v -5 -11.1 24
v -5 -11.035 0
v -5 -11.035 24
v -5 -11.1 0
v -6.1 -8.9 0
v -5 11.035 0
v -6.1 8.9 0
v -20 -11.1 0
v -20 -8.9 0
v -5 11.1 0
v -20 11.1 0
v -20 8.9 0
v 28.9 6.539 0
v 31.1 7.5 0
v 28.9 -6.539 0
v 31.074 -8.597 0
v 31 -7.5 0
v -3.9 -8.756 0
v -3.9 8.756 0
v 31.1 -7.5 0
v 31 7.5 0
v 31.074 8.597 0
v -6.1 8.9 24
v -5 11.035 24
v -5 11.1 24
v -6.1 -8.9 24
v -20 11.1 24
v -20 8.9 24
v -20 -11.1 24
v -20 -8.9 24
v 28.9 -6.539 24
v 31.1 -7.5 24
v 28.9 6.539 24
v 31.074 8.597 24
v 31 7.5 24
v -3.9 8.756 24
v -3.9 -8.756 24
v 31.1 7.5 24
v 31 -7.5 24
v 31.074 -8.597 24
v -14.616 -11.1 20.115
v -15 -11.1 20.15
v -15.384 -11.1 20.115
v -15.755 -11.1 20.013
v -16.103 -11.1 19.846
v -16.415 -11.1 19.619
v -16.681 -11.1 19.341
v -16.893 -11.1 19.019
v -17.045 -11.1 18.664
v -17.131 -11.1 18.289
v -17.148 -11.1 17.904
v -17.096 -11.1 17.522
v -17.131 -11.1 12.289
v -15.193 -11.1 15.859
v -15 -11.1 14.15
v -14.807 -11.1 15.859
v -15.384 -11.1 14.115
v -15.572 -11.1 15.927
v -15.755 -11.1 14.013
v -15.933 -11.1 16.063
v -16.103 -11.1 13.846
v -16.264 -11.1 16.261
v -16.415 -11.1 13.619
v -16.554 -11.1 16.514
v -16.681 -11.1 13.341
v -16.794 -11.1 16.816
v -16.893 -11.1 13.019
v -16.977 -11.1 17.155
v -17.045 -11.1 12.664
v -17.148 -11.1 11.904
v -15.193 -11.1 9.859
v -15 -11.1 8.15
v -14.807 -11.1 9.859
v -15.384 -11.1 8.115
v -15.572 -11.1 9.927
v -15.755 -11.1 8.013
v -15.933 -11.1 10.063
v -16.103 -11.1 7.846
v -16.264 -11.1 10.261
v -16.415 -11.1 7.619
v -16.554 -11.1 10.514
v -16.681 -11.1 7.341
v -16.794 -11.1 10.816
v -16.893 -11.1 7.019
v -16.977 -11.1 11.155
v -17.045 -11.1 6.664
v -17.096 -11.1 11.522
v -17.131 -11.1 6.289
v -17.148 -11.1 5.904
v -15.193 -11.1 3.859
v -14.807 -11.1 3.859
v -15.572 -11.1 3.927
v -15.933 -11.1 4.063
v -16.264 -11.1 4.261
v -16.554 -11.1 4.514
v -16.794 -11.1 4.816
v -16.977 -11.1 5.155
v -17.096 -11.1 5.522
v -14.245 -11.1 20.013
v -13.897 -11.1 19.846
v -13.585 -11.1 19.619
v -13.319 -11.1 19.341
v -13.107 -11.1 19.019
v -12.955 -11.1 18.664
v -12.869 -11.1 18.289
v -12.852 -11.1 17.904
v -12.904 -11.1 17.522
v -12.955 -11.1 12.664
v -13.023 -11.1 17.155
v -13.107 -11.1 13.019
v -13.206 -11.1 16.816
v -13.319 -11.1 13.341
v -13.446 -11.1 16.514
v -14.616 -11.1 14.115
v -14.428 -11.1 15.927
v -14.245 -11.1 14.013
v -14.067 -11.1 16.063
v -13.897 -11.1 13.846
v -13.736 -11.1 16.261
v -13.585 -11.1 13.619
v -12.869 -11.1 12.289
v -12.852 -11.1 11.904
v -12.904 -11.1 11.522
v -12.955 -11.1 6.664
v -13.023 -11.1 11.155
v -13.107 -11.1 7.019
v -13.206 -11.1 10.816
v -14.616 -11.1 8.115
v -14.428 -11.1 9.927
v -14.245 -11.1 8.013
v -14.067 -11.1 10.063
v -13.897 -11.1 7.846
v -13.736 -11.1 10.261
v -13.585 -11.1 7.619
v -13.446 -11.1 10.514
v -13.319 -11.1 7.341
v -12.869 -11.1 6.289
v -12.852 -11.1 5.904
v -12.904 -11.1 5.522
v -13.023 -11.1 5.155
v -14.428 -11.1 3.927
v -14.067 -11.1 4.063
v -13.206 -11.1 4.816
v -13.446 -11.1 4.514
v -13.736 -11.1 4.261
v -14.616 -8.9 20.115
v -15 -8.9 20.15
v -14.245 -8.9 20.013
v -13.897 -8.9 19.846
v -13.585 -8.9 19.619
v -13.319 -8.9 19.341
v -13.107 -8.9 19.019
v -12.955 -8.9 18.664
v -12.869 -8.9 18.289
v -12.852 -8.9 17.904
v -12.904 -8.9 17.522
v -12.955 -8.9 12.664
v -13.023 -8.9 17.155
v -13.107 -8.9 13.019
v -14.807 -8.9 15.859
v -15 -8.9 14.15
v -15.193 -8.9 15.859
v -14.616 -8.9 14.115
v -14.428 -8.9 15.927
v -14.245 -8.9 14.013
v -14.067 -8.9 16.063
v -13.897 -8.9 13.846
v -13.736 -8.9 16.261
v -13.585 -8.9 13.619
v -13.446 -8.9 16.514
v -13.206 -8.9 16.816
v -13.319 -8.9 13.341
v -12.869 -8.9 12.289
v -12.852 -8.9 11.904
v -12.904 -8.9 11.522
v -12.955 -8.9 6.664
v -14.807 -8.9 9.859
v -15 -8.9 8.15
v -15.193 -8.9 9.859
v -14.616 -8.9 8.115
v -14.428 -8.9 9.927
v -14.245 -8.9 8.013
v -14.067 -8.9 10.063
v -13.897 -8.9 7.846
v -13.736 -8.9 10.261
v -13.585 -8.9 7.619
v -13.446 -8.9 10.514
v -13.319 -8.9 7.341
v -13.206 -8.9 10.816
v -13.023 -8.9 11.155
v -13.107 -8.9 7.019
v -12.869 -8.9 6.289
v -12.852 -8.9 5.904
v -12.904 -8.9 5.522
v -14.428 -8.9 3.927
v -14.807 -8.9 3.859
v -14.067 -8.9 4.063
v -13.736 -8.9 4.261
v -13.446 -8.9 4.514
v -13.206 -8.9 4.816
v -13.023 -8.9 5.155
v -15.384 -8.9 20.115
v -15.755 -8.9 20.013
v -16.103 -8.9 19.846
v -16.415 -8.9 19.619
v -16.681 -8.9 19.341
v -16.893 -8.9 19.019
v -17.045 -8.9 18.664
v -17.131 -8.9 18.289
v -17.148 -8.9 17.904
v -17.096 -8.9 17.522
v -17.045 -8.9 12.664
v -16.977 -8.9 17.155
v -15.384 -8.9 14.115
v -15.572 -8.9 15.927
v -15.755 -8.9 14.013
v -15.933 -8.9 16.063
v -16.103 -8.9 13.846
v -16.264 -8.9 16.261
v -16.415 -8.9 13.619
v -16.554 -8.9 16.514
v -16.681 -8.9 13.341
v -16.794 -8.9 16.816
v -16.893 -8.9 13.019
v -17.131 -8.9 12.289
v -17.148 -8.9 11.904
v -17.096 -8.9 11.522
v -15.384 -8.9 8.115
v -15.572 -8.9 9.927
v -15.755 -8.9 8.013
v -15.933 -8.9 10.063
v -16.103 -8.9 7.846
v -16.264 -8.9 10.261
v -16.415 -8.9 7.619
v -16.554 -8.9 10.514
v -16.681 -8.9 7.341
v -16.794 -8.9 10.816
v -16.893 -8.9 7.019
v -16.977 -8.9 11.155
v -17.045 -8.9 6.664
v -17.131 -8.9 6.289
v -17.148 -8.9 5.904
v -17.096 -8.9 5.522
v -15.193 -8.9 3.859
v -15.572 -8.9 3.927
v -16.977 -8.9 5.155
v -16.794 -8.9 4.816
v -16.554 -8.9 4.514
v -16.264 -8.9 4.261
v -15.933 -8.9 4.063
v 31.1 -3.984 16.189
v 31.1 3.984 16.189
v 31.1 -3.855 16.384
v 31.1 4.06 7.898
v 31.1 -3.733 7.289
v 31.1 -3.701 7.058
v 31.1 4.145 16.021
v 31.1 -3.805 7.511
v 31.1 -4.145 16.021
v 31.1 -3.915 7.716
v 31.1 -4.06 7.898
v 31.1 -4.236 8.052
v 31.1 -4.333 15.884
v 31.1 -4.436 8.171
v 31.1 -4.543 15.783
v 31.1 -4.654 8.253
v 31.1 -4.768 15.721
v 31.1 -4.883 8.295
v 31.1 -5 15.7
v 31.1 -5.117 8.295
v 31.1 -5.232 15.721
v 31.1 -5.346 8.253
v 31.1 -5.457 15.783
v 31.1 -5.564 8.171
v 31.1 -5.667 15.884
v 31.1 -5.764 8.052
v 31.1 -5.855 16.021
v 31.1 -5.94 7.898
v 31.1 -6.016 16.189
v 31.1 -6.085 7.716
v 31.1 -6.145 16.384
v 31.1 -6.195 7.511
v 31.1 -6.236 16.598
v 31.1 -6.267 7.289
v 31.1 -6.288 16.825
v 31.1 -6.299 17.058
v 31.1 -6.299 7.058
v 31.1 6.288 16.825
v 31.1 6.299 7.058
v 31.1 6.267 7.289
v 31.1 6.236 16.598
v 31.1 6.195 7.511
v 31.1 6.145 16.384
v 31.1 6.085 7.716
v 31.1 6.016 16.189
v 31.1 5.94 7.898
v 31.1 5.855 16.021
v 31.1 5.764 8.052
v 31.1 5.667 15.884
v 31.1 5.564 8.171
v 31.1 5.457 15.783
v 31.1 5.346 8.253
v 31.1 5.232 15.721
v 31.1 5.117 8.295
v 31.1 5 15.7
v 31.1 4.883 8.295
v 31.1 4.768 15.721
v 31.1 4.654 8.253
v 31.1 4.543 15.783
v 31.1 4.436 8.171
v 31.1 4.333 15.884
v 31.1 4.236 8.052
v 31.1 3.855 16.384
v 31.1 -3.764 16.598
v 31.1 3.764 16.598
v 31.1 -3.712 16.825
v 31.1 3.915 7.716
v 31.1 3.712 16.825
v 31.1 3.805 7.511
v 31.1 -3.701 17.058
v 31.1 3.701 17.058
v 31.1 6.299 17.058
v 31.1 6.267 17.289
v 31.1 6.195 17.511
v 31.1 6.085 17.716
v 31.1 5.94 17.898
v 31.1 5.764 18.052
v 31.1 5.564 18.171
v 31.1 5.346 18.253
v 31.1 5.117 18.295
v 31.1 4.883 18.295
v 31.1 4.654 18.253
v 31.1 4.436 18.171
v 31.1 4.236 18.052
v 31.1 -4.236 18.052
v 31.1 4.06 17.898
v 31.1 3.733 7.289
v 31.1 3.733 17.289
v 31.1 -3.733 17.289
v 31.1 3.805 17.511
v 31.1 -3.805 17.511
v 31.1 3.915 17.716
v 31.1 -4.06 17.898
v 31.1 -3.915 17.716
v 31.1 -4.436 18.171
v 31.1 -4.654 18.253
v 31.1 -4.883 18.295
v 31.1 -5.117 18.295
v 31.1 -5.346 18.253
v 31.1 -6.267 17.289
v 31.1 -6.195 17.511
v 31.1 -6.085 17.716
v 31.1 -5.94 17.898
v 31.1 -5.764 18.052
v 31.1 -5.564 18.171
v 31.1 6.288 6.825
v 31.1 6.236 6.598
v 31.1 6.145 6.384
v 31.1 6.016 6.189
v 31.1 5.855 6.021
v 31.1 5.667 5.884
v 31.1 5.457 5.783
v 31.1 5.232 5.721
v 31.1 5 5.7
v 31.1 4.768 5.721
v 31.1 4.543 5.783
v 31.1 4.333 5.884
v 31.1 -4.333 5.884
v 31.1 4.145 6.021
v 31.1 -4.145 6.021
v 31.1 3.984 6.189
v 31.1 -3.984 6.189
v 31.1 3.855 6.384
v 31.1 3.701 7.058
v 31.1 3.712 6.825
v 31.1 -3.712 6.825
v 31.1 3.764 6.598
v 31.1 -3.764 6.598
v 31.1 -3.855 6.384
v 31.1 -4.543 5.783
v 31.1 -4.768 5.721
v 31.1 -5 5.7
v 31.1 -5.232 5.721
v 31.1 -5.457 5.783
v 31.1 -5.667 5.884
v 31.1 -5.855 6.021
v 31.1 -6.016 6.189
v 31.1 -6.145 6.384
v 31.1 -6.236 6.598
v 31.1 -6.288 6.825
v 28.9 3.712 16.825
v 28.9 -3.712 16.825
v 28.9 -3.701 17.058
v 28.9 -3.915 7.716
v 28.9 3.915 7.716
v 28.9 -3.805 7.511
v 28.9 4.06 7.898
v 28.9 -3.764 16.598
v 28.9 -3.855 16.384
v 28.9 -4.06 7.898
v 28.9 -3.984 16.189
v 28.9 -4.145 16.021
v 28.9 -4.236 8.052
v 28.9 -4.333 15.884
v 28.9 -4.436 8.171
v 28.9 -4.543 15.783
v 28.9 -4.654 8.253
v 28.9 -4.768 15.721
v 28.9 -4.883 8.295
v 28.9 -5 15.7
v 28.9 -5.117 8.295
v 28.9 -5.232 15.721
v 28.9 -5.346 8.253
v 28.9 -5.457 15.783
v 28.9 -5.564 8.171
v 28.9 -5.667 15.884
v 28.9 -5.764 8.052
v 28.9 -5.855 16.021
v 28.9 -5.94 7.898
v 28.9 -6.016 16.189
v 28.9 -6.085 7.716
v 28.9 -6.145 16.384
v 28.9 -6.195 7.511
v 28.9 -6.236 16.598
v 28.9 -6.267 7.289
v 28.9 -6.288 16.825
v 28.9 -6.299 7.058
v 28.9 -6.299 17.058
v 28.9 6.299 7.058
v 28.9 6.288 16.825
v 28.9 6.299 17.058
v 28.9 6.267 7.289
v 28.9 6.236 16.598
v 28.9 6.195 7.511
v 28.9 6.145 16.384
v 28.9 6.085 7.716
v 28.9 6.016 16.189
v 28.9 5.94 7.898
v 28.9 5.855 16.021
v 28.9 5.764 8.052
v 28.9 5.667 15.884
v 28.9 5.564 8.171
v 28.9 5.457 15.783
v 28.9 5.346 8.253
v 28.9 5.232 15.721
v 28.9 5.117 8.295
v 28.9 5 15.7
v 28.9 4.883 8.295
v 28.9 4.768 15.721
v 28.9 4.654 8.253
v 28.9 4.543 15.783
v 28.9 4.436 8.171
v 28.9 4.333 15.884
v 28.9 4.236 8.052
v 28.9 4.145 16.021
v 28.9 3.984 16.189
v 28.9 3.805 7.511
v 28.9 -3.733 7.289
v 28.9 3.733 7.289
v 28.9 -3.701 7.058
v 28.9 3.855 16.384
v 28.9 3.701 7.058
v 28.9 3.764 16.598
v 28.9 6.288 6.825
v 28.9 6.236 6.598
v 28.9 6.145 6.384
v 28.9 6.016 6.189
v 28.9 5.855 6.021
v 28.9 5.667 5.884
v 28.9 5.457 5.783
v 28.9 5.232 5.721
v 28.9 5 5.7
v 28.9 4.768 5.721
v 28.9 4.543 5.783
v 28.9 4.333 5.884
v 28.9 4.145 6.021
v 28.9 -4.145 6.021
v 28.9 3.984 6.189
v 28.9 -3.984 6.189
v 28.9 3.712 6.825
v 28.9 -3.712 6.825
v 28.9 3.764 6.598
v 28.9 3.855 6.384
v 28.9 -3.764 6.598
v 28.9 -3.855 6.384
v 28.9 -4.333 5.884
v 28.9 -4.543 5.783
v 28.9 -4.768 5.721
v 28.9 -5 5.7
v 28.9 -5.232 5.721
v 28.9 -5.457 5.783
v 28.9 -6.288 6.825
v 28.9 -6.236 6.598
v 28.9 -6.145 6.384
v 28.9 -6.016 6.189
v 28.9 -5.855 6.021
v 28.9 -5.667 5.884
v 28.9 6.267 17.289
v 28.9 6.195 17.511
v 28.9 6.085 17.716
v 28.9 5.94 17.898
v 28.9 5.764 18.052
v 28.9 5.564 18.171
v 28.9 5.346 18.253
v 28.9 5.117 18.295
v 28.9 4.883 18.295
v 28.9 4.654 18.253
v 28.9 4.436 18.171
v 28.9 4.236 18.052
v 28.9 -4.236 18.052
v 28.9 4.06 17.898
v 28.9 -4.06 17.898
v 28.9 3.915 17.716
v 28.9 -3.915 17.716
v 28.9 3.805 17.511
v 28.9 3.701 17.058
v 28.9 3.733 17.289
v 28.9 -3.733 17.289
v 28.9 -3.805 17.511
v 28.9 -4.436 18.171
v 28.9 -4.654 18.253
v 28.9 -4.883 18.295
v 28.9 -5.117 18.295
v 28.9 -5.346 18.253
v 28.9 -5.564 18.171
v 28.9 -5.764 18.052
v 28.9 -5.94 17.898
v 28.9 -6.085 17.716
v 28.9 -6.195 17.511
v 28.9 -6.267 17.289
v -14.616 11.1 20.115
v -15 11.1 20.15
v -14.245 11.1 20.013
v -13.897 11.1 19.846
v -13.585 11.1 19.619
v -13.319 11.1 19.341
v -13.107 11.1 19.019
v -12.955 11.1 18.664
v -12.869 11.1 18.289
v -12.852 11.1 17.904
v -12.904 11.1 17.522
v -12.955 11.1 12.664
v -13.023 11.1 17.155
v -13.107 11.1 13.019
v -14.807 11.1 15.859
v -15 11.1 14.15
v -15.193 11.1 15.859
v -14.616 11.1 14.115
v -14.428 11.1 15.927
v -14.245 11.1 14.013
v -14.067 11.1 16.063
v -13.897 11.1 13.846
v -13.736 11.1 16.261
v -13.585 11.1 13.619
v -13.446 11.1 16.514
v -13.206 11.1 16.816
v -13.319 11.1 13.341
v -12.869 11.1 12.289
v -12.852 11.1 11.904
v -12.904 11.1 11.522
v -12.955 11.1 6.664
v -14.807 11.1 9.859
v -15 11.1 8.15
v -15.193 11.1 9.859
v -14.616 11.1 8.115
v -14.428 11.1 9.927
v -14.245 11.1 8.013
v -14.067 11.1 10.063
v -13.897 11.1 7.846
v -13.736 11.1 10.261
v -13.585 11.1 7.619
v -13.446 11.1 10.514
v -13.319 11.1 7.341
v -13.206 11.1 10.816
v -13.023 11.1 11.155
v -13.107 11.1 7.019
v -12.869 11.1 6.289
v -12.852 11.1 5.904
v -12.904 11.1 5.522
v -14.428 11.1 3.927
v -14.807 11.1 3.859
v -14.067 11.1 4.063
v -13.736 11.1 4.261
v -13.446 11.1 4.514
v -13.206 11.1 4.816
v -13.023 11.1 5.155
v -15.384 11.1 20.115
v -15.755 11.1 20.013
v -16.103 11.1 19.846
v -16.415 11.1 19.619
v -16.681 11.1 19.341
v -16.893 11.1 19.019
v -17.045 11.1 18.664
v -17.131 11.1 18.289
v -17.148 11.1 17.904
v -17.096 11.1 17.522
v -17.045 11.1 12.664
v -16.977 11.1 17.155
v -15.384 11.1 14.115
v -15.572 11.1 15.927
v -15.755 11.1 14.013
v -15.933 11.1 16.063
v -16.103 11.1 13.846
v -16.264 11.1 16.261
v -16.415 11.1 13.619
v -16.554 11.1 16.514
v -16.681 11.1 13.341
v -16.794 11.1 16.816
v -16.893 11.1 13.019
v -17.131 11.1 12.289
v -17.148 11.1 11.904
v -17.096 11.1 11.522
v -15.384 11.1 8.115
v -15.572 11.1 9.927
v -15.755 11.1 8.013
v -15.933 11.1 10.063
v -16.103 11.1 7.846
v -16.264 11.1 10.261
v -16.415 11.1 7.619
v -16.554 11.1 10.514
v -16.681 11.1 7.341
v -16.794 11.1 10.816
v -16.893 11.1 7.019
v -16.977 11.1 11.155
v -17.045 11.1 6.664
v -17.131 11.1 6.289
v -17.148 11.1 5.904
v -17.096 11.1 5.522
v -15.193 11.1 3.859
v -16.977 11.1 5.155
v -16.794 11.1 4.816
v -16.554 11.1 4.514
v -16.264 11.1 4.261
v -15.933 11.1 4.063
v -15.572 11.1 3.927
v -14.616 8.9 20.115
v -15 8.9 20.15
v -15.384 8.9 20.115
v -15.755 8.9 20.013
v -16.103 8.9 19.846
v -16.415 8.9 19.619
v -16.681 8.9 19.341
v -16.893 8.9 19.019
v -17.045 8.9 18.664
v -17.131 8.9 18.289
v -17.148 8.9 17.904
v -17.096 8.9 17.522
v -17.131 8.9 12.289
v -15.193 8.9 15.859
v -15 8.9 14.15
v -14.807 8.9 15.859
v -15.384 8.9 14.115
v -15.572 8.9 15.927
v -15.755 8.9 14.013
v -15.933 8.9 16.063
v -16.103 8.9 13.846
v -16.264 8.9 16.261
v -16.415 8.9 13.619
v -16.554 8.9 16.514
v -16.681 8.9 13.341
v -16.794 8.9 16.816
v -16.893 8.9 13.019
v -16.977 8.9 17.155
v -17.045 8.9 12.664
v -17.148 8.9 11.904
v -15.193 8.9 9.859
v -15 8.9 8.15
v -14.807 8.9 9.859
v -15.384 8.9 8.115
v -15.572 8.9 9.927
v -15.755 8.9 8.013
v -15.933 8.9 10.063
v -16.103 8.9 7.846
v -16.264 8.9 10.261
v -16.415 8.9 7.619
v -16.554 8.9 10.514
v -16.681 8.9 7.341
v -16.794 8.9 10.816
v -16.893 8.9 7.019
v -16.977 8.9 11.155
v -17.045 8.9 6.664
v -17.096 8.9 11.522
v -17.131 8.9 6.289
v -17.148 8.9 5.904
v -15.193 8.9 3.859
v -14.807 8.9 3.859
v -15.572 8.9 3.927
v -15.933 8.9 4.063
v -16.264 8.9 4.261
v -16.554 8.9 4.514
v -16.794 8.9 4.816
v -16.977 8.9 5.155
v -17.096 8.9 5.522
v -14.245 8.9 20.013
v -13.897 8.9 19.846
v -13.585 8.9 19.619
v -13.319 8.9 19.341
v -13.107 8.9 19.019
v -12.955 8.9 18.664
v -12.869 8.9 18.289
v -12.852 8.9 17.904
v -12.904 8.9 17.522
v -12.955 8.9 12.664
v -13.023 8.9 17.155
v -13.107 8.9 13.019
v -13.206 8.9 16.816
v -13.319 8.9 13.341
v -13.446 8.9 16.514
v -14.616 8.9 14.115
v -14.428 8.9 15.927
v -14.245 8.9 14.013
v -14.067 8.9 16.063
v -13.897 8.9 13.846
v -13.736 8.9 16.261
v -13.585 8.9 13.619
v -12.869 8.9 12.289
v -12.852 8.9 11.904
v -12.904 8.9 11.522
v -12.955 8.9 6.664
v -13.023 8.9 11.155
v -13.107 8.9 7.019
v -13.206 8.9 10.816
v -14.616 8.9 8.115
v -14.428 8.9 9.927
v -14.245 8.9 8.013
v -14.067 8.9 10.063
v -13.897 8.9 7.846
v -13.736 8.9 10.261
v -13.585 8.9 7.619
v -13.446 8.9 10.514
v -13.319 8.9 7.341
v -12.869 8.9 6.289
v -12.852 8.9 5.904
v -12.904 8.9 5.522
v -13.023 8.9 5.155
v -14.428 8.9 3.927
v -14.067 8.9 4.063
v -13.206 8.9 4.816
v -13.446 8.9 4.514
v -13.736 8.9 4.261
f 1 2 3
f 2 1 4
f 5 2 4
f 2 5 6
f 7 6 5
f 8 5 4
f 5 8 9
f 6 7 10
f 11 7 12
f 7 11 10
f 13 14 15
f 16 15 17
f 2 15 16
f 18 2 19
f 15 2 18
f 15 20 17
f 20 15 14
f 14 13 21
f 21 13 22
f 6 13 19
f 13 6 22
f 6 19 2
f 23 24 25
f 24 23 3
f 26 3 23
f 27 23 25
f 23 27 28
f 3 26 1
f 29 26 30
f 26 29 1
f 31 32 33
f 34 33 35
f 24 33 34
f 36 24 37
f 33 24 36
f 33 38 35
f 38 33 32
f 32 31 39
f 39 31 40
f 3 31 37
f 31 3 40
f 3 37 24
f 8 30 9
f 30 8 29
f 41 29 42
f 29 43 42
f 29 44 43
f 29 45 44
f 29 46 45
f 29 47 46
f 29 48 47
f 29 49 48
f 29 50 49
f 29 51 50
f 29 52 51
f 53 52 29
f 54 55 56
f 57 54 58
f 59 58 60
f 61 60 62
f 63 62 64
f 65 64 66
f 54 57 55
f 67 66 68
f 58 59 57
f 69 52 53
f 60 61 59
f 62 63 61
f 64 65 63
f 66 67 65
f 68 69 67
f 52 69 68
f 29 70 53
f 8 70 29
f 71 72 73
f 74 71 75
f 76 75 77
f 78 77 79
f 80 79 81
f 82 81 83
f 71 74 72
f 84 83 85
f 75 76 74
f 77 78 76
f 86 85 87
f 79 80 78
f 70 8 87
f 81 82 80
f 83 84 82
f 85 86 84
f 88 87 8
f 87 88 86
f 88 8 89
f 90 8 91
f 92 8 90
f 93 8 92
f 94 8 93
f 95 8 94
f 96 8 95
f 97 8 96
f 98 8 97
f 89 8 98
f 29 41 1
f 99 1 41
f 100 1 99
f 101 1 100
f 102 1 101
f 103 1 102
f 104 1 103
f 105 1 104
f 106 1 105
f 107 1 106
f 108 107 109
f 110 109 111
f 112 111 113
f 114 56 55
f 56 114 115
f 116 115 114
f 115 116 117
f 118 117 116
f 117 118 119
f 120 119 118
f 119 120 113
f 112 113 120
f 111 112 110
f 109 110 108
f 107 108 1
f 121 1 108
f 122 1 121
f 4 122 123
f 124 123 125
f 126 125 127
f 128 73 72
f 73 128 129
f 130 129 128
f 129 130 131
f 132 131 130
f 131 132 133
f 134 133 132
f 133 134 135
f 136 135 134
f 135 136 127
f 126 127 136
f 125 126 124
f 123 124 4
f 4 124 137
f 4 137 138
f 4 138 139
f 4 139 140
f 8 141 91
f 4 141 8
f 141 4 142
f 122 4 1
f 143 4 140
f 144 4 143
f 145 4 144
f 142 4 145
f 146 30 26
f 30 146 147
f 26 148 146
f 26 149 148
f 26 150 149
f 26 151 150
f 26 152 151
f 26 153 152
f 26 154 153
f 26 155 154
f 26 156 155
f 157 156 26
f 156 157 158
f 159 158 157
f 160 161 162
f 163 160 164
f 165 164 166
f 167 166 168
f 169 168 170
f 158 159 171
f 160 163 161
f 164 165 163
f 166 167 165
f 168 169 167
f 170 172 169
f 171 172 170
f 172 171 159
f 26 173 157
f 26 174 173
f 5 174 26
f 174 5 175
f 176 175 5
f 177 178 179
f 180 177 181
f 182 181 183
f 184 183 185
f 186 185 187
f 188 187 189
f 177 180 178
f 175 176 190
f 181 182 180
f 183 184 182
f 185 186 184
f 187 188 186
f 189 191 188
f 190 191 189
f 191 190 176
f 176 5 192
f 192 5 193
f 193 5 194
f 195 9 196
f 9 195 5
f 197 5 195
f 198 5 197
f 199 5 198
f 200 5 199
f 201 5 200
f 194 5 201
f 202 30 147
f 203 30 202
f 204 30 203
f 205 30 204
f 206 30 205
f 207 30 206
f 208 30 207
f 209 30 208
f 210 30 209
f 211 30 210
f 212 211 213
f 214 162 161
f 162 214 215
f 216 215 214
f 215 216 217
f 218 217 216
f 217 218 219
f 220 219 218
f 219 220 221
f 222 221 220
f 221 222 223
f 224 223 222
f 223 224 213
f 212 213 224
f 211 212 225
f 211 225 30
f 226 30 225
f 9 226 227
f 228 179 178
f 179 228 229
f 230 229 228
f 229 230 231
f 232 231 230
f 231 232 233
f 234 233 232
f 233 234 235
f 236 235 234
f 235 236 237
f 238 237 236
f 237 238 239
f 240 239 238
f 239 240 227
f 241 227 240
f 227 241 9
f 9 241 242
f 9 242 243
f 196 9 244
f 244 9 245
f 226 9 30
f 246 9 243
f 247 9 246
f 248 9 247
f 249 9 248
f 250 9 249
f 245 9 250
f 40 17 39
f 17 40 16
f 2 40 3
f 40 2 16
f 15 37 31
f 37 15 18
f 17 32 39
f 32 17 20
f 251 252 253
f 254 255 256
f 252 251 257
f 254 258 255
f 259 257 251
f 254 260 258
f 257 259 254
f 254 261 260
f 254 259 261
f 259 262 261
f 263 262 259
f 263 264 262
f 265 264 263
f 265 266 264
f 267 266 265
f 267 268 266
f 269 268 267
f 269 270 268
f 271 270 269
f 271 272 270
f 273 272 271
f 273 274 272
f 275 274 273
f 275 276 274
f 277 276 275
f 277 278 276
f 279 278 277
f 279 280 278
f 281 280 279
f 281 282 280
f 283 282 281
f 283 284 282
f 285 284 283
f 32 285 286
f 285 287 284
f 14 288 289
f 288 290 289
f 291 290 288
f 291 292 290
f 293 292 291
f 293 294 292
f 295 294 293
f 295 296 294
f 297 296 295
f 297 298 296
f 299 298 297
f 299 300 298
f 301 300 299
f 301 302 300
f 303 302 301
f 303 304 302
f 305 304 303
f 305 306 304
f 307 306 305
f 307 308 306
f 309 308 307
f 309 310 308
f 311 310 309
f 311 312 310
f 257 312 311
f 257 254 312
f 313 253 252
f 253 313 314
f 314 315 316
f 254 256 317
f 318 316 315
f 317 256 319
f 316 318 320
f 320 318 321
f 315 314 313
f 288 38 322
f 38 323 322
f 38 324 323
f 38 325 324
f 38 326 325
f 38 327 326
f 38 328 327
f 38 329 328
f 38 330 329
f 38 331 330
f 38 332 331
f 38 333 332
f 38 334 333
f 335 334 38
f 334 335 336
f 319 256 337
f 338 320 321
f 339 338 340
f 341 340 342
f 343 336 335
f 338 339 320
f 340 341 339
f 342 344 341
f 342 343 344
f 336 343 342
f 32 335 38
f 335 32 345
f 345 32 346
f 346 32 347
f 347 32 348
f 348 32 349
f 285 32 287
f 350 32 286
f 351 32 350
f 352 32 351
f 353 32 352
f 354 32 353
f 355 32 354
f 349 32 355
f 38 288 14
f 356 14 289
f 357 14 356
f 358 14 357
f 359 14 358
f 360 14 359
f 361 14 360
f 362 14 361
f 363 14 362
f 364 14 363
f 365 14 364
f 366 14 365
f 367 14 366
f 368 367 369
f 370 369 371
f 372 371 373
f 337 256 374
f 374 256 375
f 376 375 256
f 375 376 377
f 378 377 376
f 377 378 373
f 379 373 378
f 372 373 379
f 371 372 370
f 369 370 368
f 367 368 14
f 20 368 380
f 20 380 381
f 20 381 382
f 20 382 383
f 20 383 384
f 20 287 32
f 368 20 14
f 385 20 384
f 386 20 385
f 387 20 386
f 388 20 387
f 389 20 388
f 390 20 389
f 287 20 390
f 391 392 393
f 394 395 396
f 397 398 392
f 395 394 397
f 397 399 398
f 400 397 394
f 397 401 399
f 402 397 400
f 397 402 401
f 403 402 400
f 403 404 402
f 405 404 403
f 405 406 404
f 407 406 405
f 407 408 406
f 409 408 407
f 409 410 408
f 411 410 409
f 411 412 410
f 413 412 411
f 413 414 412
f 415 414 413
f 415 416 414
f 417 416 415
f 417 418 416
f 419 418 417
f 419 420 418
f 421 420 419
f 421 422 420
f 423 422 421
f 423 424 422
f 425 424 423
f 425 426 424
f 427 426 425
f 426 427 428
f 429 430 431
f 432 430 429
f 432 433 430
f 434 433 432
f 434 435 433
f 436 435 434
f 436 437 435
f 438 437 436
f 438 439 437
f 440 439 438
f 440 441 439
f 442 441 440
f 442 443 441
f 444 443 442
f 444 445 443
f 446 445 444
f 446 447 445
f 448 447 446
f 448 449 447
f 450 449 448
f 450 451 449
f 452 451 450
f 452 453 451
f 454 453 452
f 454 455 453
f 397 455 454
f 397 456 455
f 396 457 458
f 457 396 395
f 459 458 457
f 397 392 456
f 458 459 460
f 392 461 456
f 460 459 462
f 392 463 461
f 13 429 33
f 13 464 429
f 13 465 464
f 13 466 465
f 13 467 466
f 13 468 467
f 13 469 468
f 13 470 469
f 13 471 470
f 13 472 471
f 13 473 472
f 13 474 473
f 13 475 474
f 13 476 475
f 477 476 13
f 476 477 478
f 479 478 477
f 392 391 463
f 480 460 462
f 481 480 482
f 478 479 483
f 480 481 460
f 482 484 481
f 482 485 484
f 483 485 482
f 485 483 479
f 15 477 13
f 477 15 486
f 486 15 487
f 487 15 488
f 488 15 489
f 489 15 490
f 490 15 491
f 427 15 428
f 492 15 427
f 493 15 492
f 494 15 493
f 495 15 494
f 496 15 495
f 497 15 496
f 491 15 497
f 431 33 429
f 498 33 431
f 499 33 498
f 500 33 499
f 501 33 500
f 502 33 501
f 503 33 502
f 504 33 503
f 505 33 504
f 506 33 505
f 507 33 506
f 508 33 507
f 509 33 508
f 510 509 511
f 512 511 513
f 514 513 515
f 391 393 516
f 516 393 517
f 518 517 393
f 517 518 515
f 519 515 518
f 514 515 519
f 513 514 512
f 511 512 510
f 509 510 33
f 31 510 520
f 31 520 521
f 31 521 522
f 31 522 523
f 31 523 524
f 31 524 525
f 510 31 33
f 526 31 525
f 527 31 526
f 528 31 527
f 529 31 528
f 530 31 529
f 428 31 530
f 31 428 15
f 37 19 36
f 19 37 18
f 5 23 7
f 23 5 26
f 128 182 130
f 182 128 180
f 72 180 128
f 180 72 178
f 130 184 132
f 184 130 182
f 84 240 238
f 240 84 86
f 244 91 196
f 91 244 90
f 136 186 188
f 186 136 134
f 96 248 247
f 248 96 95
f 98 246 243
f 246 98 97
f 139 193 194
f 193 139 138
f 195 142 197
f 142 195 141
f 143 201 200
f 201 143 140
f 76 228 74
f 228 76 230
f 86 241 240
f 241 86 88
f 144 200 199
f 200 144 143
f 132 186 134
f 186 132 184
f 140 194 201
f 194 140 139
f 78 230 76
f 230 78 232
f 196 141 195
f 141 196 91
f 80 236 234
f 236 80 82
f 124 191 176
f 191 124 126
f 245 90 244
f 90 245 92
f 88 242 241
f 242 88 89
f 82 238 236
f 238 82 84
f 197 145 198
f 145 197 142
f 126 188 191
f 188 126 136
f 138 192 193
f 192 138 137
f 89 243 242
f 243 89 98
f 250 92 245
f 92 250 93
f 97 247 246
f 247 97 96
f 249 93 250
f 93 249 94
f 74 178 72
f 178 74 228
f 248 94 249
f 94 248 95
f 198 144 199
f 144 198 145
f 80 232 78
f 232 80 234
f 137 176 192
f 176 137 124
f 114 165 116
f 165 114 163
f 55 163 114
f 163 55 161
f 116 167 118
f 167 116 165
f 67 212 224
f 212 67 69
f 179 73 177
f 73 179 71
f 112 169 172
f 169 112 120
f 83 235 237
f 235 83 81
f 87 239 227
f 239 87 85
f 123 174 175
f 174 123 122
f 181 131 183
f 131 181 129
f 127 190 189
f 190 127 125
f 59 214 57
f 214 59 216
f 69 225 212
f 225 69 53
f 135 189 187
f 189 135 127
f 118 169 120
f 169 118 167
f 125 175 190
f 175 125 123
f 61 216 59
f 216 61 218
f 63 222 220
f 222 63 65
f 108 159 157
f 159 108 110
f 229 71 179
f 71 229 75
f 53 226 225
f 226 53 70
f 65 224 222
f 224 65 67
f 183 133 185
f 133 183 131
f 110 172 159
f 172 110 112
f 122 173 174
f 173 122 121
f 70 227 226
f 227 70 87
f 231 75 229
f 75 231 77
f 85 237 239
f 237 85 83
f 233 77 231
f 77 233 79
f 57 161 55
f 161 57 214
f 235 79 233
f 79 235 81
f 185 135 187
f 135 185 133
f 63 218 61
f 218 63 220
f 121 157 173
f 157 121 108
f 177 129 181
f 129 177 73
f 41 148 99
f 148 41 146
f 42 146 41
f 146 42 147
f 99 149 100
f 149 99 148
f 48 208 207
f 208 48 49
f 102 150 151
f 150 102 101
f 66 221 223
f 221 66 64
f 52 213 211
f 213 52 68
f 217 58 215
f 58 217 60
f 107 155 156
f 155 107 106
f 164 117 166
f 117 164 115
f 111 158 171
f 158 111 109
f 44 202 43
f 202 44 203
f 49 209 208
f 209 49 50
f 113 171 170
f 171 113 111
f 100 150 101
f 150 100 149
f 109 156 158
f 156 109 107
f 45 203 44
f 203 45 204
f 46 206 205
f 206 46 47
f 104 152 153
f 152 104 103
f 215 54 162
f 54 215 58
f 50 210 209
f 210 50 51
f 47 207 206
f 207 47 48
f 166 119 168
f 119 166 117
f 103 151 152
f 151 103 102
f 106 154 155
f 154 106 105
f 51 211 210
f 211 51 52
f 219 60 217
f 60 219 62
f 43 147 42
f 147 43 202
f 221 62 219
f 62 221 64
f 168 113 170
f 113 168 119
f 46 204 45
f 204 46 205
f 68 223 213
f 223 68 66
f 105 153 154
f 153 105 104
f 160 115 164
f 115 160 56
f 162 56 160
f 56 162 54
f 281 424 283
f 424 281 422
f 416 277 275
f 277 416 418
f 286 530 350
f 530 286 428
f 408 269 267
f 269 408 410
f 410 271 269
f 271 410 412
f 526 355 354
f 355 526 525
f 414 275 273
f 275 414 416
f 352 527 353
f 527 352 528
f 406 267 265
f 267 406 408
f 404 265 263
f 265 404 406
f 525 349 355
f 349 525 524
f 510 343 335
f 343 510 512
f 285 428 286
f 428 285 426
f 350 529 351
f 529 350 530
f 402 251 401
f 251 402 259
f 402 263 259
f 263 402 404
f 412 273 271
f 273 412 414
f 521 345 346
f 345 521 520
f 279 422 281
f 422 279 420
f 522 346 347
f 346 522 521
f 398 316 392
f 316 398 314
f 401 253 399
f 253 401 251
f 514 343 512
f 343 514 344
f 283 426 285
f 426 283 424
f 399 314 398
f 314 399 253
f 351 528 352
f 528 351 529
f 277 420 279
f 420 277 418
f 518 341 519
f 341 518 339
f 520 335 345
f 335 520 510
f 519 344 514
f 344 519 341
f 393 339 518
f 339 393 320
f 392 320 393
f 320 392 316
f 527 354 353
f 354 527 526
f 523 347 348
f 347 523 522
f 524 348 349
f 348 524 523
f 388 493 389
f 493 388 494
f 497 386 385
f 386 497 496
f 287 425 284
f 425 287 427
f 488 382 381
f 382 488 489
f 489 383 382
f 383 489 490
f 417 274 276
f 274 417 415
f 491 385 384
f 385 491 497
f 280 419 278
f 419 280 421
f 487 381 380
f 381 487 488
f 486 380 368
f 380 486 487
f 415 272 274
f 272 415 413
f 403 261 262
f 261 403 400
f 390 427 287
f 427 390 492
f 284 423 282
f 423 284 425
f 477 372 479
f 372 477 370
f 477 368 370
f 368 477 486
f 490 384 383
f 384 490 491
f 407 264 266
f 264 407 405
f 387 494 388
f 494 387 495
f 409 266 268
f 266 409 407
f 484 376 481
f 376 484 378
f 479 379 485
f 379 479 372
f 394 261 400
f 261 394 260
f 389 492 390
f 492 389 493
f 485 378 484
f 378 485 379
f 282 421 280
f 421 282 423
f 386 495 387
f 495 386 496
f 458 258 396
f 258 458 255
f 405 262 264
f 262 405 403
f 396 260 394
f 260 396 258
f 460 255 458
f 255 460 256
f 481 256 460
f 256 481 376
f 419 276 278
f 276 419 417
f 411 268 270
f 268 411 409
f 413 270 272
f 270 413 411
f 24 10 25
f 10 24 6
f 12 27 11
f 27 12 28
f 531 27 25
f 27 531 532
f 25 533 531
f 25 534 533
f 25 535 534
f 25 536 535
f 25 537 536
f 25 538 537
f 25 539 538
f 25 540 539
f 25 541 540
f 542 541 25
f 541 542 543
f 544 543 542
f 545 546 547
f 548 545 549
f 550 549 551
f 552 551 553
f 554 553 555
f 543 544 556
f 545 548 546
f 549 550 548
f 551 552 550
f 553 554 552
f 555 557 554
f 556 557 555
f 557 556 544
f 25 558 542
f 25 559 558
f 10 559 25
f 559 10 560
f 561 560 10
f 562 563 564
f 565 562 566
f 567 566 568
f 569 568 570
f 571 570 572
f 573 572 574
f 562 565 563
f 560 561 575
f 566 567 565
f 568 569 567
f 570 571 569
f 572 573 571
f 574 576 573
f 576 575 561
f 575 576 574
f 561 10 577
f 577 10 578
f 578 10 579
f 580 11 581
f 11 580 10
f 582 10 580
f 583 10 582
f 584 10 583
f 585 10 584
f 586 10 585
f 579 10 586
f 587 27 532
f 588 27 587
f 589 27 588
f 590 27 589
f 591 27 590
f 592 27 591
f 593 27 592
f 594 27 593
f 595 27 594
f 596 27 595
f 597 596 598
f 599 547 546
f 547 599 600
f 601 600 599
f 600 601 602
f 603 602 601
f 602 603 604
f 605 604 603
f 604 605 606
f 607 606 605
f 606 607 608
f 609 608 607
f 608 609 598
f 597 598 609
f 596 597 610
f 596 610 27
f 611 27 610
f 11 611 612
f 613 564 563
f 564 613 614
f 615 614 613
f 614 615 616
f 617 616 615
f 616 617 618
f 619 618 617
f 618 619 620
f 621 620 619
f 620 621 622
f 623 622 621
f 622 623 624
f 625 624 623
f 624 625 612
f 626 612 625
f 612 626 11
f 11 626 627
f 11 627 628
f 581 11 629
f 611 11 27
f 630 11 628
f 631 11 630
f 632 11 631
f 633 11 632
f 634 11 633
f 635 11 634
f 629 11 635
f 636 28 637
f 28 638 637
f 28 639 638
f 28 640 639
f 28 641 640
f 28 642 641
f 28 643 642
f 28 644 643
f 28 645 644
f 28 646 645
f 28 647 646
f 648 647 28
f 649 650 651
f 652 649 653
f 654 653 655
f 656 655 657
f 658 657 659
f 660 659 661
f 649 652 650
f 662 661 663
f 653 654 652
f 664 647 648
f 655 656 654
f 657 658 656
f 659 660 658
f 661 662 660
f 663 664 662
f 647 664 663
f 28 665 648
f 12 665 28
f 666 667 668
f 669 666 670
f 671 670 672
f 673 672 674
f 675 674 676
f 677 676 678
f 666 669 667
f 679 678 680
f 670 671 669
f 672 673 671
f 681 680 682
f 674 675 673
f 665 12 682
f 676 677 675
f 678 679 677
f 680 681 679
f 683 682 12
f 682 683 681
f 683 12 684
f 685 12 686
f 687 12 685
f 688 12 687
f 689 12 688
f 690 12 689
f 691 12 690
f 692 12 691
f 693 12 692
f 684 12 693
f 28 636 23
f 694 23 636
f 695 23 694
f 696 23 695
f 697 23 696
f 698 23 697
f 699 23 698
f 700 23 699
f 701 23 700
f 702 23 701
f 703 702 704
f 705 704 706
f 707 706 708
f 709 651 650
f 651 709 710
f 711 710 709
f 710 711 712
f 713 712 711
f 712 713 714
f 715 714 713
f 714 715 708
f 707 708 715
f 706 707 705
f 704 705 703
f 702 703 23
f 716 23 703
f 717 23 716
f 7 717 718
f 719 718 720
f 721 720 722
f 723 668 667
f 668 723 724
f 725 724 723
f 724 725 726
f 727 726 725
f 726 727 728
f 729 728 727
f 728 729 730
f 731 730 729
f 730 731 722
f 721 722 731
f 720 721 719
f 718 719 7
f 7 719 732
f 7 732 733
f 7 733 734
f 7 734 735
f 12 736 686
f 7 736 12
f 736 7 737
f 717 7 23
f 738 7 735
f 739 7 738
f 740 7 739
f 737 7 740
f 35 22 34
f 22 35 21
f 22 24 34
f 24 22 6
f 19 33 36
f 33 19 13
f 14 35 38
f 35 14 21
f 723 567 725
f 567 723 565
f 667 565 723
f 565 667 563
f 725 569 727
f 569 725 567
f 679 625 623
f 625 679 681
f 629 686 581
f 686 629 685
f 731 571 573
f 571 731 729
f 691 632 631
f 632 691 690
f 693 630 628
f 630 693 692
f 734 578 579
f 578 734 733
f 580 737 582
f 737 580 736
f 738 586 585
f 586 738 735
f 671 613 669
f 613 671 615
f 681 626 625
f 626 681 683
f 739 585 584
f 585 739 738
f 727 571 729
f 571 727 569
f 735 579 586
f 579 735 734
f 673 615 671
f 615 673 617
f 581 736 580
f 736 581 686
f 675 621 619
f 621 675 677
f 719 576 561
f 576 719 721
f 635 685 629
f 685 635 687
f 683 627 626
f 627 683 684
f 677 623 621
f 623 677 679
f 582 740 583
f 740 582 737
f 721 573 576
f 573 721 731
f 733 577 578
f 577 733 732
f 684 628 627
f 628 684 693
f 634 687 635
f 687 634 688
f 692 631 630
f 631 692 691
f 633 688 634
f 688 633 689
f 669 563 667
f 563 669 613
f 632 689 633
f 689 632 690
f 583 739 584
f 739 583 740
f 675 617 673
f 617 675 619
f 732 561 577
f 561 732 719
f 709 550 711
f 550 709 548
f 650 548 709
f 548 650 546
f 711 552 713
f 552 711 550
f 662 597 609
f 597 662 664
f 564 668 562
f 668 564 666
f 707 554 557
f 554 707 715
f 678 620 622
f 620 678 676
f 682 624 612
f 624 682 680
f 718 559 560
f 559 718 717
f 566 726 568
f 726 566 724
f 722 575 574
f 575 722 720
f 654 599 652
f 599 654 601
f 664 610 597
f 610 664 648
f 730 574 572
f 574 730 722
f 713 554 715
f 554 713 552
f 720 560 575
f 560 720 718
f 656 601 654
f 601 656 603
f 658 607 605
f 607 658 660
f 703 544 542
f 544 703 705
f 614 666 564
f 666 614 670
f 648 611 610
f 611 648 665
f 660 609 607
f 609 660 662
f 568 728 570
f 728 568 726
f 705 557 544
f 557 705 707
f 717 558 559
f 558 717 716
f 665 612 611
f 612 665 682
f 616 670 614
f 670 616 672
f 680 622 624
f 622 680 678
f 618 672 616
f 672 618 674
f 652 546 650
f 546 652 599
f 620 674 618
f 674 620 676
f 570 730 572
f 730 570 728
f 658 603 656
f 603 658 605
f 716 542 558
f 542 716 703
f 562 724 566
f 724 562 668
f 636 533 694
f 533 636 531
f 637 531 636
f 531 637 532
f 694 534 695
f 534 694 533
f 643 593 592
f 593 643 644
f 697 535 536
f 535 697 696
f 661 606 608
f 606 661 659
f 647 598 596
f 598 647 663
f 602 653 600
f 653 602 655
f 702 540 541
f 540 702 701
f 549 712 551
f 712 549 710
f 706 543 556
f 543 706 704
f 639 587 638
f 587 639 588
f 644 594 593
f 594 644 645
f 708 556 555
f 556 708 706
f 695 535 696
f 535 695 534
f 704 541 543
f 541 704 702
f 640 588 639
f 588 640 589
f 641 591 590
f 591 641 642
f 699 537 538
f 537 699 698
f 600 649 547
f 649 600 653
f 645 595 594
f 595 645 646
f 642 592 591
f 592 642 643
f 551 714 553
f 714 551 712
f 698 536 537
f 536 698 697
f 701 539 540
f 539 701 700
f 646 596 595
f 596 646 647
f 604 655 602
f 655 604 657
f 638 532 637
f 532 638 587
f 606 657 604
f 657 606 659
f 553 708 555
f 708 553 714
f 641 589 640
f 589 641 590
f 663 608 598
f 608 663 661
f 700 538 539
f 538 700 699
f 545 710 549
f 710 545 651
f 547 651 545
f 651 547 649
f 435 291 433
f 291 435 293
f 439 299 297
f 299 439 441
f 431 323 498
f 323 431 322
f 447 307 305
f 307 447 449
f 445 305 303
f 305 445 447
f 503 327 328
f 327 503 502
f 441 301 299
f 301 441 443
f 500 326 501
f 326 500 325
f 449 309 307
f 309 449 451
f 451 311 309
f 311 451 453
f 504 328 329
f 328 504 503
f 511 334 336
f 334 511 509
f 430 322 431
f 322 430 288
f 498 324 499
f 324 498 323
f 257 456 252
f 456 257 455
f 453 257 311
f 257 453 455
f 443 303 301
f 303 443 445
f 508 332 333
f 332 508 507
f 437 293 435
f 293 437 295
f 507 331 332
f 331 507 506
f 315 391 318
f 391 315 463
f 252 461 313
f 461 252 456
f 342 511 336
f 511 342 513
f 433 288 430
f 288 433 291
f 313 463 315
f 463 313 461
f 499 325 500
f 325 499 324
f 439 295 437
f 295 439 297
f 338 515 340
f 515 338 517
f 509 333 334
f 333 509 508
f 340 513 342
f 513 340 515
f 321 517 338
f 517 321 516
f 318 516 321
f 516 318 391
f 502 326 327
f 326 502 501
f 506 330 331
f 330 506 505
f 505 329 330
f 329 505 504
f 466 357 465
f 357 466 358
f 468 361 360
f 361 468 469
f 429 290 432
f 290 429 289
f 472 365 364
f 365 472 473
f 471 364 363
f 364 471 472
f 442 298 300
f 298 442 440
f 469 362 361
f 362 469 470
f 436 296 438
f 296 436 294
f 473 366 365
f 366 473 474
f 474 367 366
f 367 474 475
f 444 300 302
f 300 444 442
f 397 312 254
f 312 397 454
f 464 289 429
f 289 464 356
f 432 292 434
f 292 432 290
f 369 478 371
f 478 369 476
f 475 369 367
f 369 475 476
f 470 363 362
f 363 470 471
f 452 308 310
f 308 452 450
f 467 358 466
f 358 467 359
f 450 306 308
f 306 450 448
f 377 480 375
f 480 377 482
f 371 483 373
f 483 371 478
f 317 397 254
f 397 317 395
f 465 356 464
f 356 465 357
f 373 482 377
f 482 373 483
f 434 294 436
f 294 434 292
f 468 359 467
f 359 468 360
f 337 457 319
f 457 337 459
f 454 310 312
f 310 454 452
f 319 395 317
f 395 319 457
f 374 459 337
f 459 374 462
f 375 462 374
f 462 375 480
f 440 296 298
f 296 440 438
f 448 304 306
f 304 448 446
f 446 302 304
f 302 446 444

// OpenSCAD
// file: ../../util/thickLine.scad
//Draw a line with given width in XY plane with given height
//in Z direction from point 1 to point 2
module thickLine(pt1=[0,0], pt2=[1,0], width=1, height=1) {
        dist = sqrt(
                (pt1[0]-pt2[0])*(pt1[0]-pt2[0])+
                (pt1[1]-pt2[1])*(pt1[1]-pt2[1]));
        translate([pt1[0],pt1[1],0])
        rotate(atan2(pt2[1]-pt1[1], pt2[0]-pt1[0]))
        translate([0,-width/2,0])
        cube([dist, width, height]);
}
// file: ../../util/rounded.scad
// Do a rounded cube
module rounded(x=10, y=10, z=10, r=3, center=false) {
  if (center) {
    translate([-(x/2),-(y/2),0])
      rounded(x, y, z, r);
  } else {
    translate([r,r,0])
    minkowski() {
      cube([x-2*r,y-2*r,z/2]);
      cylinder(h=z/2, r=r);
    }
  }
}
// file: ../../models/motor_arm.scad
include <motor.scad>;
use <arm.scad>;

module motorArm() {
  motor();
  translate([0,0,MotorDepth/2])
    arm();
  translate([0,0,-MotorDepth/2-OlloWidth])
    arm();	
}

motorArm();
// file: ../../models/arm.scad
include <ollo.scad>;

module arm() {
    color([0.6,0.6,0.6]) {
        difference() {
            cylinder(d=20, h=OlloWidth);
            servoArm(OlloWidth);
        }
    }
}

arm();
// file: ../../models/motor.scad
include <ollo.scad>;
use <../util/rounded.scad>;

// Motor dimensions
MotorWidth = 24; 
MotorHeight = 36; 
MotorDepth = 24; 
MotorArmOffset = 9;

module motor(width=2.2) {
  translate([0,-MotorArmOffset,-MotorDepth/2]) {
  color([0.25,0.25,0.25]) {
	 difference() {
  	   rounded(MotorWidth,MotorHeight,MotorDepth,3,center=true);

		// Bottom
      translate([-MotorWidth/2-0.1,-MotorHeight/2-0.1,3])
	     cube([MotorWidth+0.2, 5.7, MotorDepth-6]);

		translate([0,-MotorHeight/2+3])
		  threeOllo(MotorDepth);

		// Motor shaft
	   translate([0, MotorArmOffset])
     	  olloHole(MotorDepth+5);

		// Side holes
		for (side=[-MotorWidth/2,MotorWidth/2-width]) {
		translate([side,9,MotorDepth/2]) {
		  rotate([0,90,0]) {
		   threeOllo();
			translate([0,-3*OlloSpacing,0])
			  threeOllo();
		  }
		}
		}
	 }
  }
	}
}

motor();
// file: ../../parts/u.scad
use <../models/ollo.scad>;

module u(height=15, radius=8, width=2.2, screwsSpacing=10, screwsDiameter=2.6, screws=true, olloScrew=false, widthSize=15, print=false) {
    module Ubranch() {
        union() {  
            cylinder(width, 10, 10);
            translate([-10,0,0])
                cube([20, height, width]);
        }
    }

    module USide() {
        difference() {
            union() {
                Ubranch();
                translate([-10,height+radius-width,radius])
                    cube([20,width,widthSize-(radius-width)]);
                translate([-10,height,radius]) {
                    rotate([0,90,0]) {
                        difference() {
                            cylinder(20,radius,radius);
                            translate([0,0,-1])
                                cylinder(22,radius-width,radius-width);
                            translate([-10+radius-width,-10,-1])
                                cube([10,10,22]);
                            translate([-10,-20+radius-width,-1])
                                cube([10,20.01,22]);
                        }
                    }
                }
            }
            servoArm(depth=6);
        }
    }

    module UScrews() {
        for (x=[-screwsSpacing/2,screwsSpacing/2]) {
            for (y=[-screwsSpacing/2,screwsSpacing/2]) {
                rotate([270,0,0])
                    translate([x,y,0])
                    cylinder(d=screwsDiameter, h=100);
            }
        }
    }

	module UOllo() {
		rotate(-90, [1,0,0])
			servoArm(2*height);
	}

    if (print) {
        translate([0,0,10])
            rotate([0,90,0])
            u(height,radius,width,screwsSpacing,screwsDiameter,
                screws,olloScrew,widthSize,false);
    } else {
        echo("[PART] u");
        difference() {
            translate([0,0,-widthSize-width]) {
                USide();
                mirror([0,0,1]) translate([0,0,-2*width-2*widthSize])  
                    USide();
            }
            if (screws) {
                UScrews();
            }
            if (olloScrew) {
                UOllo();
            }
        }
    }
}

u();
// file: ../../joints/double_u.scad
use <../parts/u.scad>;
use <../models/motor_arm.scad>;

module double_u(height=15, radius=8, width=2.2, screwsSpacing=10, screwsDiameter=2.6, screws=true, col="white", alpha=0) {
   translate([0,0,0]) {
        color(col)
            u(height, radius, width, screwsSpacing, screwsDiameter, screws);
        translate([0,(height+radius)*2,0]) {
            rotate([0,90,180]) {
                color(col)
                    u(height, radius, width, screwsSpacing, screwsDiameter, screws);
                rotate([0,0,alpha]) {
                    motorArm();
                    children();
                }
            }
        }
    }
}

double_u();
// file: ../models.scad
include <config.scad>;
include <../models/ollo.scad>;
use <../models/motor.scad>;
use <../models/arm.scad>;
use <../parts/u.scad>;
use <../models/motor_arm.scad>;
use <../util/rounded.scad>;
use <../util/thickLine.scad>;

module gecky_model_tail_body(sizeSide=20, sizeLength=20, angleTail=45, lengthTail=40, widthTail=10, width=2.2) {
	module bodySegment(size) {
		rotate(-90)
		difference() {
			translate([-10,0,0])
				rounded(20, size, width, 5);
			translate([0,size-5,0])
			threeOllo();
		}
	}

	bodySegment(sizeLength);
	rotate(-90)
		bodySegment(sizeSide);
	rotate(90)
		bodySegment(sizeSide);
	translate([-15,-5,0])
		cube([10,10,width]);
	
	thickLine([-10,0], 
		[-10-cos(angleTail)*lengthTail,-sin(angleTail)*lengthTail], widthTail, width);
	thickLine([-10,0], 
		[-10-cos(angleTail)*lengthTail,sin(angleTail)*lengthTail], widthTail, width);
}

module gecky_model_leg(length=60, height=20, widthSizeBegin=20, widthSizeEnd=15, width=2.2, print=false) {
	size1 = 15;
	module part() {
		difference() {
			translate([-5,0,-height/2])
			union() {
				thickLine([0,widthSizeBegin/2], [size1,widthSizeBegin/2], width, height);
				thickLine([size1-1,widthSizeBegin/2], [length+1,widthSizeEnd/2], width, height);
				thickLine([length,widthSizeEnd/2], [length,0], width, height);
				thickLine([size1,widthSizeBegin/2], [size1,0], width, height);
			}
			translate([0,widthSizeBegin/2+2,0])
				rotate(90, [0,1,0]) rotate(90,[1,0,0])
					threeOllo(10);
			for (x=[-UScrewsSpacing/2,UScrewsSpacing/2]) {
            for (y=[-UScrewsSpacing/2,UScrewsSpacing/2]) {
					translate([length,x,y]) rotate(-90, [0,1,0]) 
               	cylinder(d=UScrewsDiameter, h=10);
        		}
      	}
		}
	}
	
	if (print) {
		translate([-size1,0,height/2]) rotate(90, [1,0,0])
			gecky_model_leg(length=length, height=height, widthSizeBegin=widthSizeBegin, 
				widthSizeEnd=widthSizeEnd, width=width, print=false);
	} else {
		rotate(90, [1,0,0])
		union() {
			part();
			mirror([0,1,0])
				part();
			translate([length-5,0,0])
				children();
		}
	}
}

module gecky_model_foot(height=50, width=2.2, depth=4, widthSizeTop=15, widthSizeEnd=5, print=false) {
	if (print) {
		rotate(-90, [0,1,0])
			gecky_model_foot(height=height, width=width, depth=depth, 
				widthSizeTop=widthSizeTop, widthSizeEnd=widthSizeEnd, print=false);
	} else {
		rotate(180, [1,0,0]) rotate(90, [0,0,1])
		translate([0,0,-UScrewsSpacing])
		difference() {
			union() {
				cylinder(h=height, r=widthSizeTop/2, r2=widthSizeEnd/2);
				translate([0,0,height])
					sphere(widthSizeEnd/2);
				translate([-widthSizeTop/2,-width,0])
					cube([widthSizeTop,width,2*UScrewsSpacing]);
			}
			translate([-50, 0, -5])
				cube(100);
			translate([-50, -100-depth, -5])
				cube(100);
			for (x=[-UScrewsSpacing/2,UScrewsSpacing/2]) {
      		for (y=[-UScrewsSpacing/2,UScrewsSpacing/2]) {
					translate([x,10,y+UScrewsSpacing]) rotate(90, [1,0,0])
         			cylinder(d=UScrewsDiameter, h=20);
         	}
     		}
		}
	}
}

module gecky_model_head_body(widthSize=5, width=2.2, print=false) {
	module part() {
		difference() {
			translate([0,-MotorWidth/2,0])
				rounded(MotorHeight, MotorWidth, width, 5);
			translate([5,0,0]) rotate(90)
				threeOllo();
			translate([5+3*OlloSpacing,0,0]) rotate(90)
				threeOllo();
		}
	}

	module multipart() {
		part();
		translate([2*MotorHeight,-MotorWidth/2-widthSize/2,0]) rotate(180)
			part();
		translate([2*MotorHeight,MotorWidth/2+widthSize/2,0]) rotate(180)
			part();
		translate([MotorWidth+5,-MotorHeight/2,0])
			rounded(MotorWidth/2, MotorHeight, width, 5);
		translate([MotorHeight/2+15,-1.5*widthSize/2,0])
			cube([MotorHeight, 1.5*widthSize, width]);
	}
	
	if (print) {
		translate([-MotorHeight,0,0])
			multipart();
	} else {
		translate([-5,0,0])
			multipart();
	}


	if (print == false && $children > 0) {
		translate([2*MotorHeight-10,widthSize/2+MotorWidth/2,width]) 
			rotate(90, [0,1,0]) rotate(90, [1,0,0]) 
      		children(0);
   	translate([2*MotorHeight-10,-widthSize/2-MotorWidth/2,width+MotorDepth]) 
			rotate(180, [1,0,0]) rotate(90, [0,1,0]) rotate(90, [1,0,0])
      		children(1);
	}
}

module gecky_model_head_u(width=2.2, print=false) {
	if (print) {
		u(height=UHeight, radius=URadius, width=width, screws=false, 
			olloScrew=true, widthSize=MotorWidth/2, print=true);
	} else {
		rotate(-90, [1,0,0]) translate([0,-UHeight-URadius,0]) rotate(90, [0,1,0])
		union() {
			difference() {
				u(height=UHeight, radius=URadius, width=width, screws=false, 
					olloScrew=true, widthSize=MotorWidth/2);
			}
			rotate(180, [1,0,0])
				children();
		}
	}
}
// file: ../../models/ollo.scad
// Diameter of plastic ollo holes
OlloHoles = 4.3;

// Width of Ollo "real" plastic
OlloWidth = 3;

// Distance between two ollo holes
OlloSpacing = 6;

// Do an Ollo hole on the part
module olloHole(depth=2.2)
{
    translate([0,0,-0.1])
      cylinder(depth+0.2, OlloHoles/2, OlloHoles/2);
}

// Do 3 ollo holes
module threeOllo(depth=2.2)
{
  for (xy=[[-OlloSpacing,0],[0,0],[OlloSpacing,0]]) {
    translate([xy[0], xy[1], 0])
    olloHole(depth);
  }
}

// Do a servo arm holes
module servoArm(depth=2.2)
{
    threeOllo(depth);
    rotate([0,0,90])
      threeOllo(depth);
}
// file: ../parts.scad
include <config.scad>;
include <../models/ollo.scad>;
use <models.scad>;
use <../joints/double_u.scad>;
use <../parts/u.scad>;

module gecky_tail_body(print=false) {
	gecky_model_tail_body(sizeSide=TailBodySizeSide, sizeLength=TailBodySizeLength, 
		angleTail=TailAngle, lengthTail=TailLength, widthTail=TailWidth, width=Width, print=print);
}

module gecky_leg(print=false) {
	gecky_model_leg(length=LegLength, height=MotorWidth, width=Width, print=print)
		children();
}
module gecky_foot(print=false) {
	gecky_model_foot(height=FootHeight, width=Width, widthSizeEnd=FootRadius, print=print);
}
module gecky_head_body(print=false) {
	if ($children > 0) {
		gecky_model_head_body(widthSize=HeadBodySize, width=Width, print=print) {
			children(0);
			children(1);
		}
	} else {
		gecky_model_head_body(widthSize=HeadBodySize, width=Width, print=print);
	}
}
module gecky_u(print=false) {
	gecky_model_head_u(width=Width, print=print)
		children();
}
module gecky_double_u(print=false) {
	if (print) {
		u(UHeight, URadius, Width, UScrewsSpacing, UScrewsDiameter, print=print);
	} else {
		double_u(UHeight, URadius, Width, UScrewsSpacing, UScrewsDiameter, print=print)
			children();
	}
}

gecky_double_u(print=true);
// file: ../config.scad
// Width of parts (2.2 is good for Ollo rivets)
Width = 2.2;

// Motor dimensions
MotorWidth = 24;
MotorHeight = 36;
MotorDepth = 24;
MotorArmOffset = 9;

// U dimensions
UHeight = 14;
URadius = 8;
UWidth = 30+Width/2;
UTotalHeight = UHeight+URadius;
UScrewsSpacing = 10;
UScrewsDiameter= 2.6;

//Gecky parts parameters
LegLength = 50;
FootHeight = 50;
FootRadius = 8;
TailBodySizeSide = 20;
TailBodySizeLength = 50;
TailAngle = 55;
TailWidth = 10;
TailLength = 40;
HeadBodySize = 8;

// Defining the resolution
$fn=35;
// main file
include <../config.scad>;
use <../parts.scad>;

gecky_leg(print=true);
